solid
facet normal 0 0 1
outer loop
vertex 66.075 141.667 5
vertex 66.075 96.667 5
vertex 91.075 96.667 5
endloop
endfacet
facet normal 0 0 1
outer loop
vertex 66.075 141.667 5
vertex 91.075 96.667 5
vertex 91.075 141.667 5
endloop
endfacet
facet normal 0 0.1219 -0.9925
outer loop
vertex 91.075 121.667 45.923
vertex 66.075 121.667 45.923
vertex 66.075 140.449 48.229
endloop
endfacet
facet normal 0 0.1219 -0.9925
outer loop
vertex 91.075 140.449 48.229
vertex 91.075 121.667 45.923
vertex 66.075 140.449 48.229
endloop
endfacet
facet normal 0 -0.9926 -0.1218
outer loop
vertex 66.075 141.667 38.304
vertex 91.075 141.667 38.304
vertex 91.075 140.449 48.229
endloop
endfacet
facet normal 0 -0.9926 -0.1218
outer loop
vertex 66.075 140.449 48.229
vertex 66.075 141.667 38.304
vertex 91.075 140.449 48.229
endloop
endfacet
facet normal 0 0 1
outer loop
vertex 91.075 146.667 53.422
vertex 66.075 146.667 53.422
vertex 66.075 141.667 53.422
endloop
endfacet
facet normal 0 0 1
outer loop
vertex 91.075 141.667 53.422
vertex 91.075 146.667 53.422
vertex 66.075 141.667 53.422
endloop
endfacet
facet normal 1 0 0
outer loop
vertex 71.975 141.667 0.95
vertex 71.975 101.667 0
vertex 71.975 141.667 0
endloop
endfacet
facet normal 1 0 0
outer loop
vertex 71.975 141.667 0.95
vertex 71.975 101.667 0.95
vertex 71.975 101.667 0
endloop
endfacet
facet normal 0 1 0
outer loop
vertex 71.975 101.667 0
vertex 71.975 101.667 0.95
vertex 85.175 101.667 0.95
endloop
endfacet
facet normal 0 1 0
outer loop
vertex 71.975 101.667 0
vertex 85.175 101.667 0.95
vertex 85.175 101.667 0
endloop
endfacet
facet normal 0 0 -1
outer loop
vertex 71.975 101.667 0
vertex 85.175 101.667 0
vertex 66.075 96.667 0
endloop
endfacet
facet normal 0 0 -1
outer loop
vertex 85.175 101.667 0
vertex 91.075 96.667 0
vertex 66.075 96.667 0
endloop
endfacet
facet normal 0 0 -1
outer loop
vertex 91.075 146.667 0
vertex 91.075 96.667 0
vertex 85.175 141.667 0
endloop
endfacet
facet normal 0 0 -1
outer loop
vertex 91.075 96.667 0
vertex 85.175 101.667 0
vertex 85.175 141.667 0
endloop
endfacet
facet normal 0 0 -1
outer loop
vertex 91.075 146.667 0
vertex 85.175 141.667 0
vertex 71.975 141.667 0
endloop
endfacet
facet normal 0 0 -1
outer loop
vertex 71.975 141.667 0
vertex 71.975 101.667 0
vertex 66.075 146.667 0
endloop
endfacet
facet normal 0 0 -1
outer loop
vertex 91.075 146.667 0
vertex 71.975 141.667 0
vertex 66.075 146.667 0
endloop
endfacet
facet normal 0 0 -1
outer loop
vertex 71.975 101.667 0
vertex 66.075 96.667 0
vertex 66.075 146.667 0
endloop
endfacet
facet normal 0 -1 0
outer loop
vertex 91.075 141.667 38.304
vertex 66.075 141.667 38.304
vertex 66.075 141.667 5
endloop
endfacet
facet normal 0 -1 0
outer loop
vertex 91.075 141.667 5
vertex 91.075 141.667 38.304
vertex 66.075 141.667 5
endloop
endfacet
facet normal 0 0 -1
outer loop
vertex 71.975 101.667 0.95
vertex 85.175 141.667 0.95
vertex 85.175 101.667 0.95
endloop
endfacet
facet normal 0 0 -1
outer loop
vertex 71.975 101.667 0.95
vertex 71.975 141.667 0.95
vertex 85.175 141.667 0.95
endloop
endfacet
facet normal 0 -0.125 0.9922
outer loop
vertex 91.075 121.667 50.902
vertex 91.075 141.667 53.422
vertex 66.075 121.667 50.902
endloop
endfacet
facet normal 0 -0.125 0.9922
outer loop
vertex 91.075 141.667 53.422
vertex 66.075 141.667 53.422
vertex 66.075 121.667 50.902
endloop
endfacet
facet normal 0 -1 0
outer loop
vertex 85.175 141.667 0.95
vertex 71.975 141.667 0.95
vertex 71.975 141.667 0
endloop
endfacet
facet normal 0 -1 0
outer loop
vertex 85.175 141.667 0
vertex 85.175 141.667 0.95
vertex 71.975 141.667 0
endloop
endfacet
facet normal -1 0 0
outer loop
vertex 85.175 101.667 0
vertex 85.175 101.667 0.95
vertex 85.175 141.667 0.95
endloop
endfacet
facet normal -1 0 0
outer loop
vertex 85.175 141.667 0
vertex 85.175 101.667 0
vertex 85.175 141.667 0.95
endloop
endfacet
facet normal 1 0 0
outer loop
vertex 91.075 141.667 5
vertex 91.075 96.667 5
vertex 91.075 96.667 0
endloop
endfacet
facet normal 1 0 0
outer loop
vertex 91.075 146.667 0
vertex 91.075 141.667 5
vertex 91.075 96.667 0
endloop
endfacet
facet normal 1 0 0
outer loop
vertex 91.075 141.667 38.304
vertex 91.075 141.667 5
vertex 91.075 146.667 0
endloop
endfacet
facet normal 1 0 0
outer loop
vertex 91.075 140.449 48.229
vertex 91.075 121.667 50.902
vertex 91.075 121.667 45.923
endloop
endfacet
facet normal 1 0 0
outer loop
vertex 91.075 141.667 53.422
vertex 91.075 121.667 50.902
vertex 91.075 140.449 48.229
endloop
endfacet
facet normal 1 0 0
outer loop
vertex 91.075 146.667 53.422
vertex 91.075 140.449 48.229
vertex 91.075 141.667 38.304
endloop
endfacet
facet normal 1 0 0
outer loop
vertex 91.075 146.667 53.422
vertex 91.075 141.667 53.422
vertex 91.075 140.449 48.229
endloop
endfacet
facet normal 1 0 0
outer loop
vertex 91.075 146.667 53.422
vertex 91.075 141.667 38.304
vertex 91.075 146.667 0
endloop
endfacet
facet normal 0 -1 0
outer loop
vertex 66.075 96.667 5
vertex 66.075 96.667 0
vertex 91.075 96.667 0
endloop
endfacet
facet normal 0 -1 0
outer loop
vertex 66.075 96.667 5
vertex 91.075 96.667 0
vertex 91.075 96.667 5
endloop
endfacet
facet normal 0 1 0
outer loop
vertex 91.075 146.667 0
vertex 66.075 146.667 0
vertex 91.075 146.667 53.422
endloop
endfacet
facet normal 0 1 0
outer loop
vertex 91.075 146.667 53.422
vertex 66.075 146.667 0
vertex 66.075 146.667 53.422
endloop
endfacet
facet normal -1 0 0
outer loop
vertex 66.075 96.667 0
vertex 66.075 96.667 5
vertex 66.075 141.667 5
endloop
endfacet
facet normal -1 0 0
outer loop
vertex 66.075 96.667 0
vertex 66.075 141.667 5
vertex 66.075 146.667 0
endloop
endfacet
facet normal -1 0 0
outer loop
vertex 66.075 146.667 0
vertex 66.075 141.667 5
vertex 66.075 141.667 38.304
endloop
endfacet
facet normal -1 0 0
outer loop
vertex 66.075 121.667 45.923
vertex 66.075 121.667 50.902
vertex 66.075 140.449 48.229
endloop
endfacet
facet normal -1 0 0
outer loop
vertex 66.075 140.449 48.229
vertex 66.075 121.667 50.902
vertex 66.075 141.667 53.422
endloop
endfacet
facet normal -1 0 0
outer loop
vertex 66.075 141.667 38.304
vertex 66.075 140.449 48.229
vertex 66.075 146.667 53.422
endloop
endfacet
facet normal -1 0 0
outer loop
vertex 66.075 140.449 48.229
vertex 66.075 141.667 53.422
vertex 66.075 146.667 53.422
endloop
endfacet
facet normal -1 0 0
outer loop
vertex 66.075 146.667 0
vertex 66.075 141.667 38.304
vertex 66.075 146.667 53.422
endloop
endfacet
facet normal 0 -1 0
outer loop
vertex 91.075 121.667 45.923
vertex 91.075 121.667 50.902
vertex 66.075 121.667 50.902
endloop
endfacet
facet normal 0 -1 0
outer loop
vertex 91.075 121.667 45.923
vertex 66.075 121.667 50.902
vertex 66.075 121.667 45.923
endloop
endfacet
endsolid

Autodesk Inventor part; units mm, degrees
ref_plane "XZ Plane" through (0, 0, 0) normal (0, 1, 0) x (-1, 0, 0)
ref_plane "XY Plane" through (0, 0, 0) normal (0, 0, 1) x (1, 0, 0)
ref_plane "Work Plane1" through (78.575, 0, 0) normal (1, 0, 0) x (0, 1, 0)
sketch "Sketch2" plane through (78.575, 0, 0) normal (1, 0, 0) x (0, 1, 0)
  line L0 (-170.29, 0) -> (141.6673, 38.3035) projected
  line L1 (141.6673, 38.3035) -> (140.4486, 48.229) projected
  line L2 (-171.5087, 9.9255) -> (140.4486, 48.229) projected
  line L3 (-170.29, 0) -> (-171.5087, 9.9255) projected
  line L4 (-304.8, 0) -> (304.8, 0) projected
  line L5 (-304.8, 0) -> (-304.8, -25.4) projected
  line L6 (304.8, -25.4) -> (-304.8, -25.4) projected
  line L7 (304.8, 0) -> (304.8, -25.4) projected
  line L8 (141.6673, 0) -> (146.6673, 0)
  line L9 (146.6673, 0) -> (146.6673, 53.4221)
  line L10 (146.6673, 53.4221) -> (141.6673, 53.4221)
  line L11 (141.6673, 53.4221) -> (141.6673, 0)
  line L12 (141.6673, 53.4221) -> (121.6673, 53.4221)
  line L13 (121.6673, 53.4221) -> (121.6673, 38.3035)
  line L14 (121.6673, 38.3035) -> (141.6673, 38.3035)
  line L15 (141.6673, 38.3035) -> (141.6673, 53.4221)
  line L16 (141.6673, 38.3035) -> (140.4486, 48.229)
  line L17 (121.6673, 45.8628) -> (140.4486, 48.229)
  line L18 (146.6673, 0) -> (96.6673, 0)
  line L19 (96.6673, 0) -> (96.6673, 5)
  line L20 (96.6673, 5) -> (146.6673, 5)
  line L21 (146.6673, 5) -> (146.6673, 0)
  line L22 (141.6673, 53.4221) -> (121.6673, 50.9023)
  line L23 (101.6673, 0) -> (141.6673, 0)
  line L24 (141.6673, 0) -> (141.6673, 0.95)
  line L25 (141.6673, 0.95) -> (101.6673, 0.95)
  line L26 (101.6673, 0.95) -> (101.6673, 0)
  point P0 (0, 0)
  point P1 (141.6673, 5)
  point P2 (121.6673, 45.9229)
  dimension "d2" = 5
  dimension "d3" = 20
  dimension "d4" = 50
  dimension "d5" = 5
  dimension "d6" = 5
  dimension "d7" = 40
  dimension "d8" = 5
  dimension "d9" = 0.95
extrude "Extrusion1" add sketch "Sketch2" along normal mid plane 25 contours L1 L2 L13 L22 L11 | L11 L10 L9 L20 | L19 L20 L11 L25 L26 L4 | L20 L9 L4 L11 | L26 L25 L11 L4
extrude "Extrusion2" cut sketch "Sketch2" along normal mid plane 13.2 contours L26 L25 L11 L4
properties part number "coverHolder_CPY"
